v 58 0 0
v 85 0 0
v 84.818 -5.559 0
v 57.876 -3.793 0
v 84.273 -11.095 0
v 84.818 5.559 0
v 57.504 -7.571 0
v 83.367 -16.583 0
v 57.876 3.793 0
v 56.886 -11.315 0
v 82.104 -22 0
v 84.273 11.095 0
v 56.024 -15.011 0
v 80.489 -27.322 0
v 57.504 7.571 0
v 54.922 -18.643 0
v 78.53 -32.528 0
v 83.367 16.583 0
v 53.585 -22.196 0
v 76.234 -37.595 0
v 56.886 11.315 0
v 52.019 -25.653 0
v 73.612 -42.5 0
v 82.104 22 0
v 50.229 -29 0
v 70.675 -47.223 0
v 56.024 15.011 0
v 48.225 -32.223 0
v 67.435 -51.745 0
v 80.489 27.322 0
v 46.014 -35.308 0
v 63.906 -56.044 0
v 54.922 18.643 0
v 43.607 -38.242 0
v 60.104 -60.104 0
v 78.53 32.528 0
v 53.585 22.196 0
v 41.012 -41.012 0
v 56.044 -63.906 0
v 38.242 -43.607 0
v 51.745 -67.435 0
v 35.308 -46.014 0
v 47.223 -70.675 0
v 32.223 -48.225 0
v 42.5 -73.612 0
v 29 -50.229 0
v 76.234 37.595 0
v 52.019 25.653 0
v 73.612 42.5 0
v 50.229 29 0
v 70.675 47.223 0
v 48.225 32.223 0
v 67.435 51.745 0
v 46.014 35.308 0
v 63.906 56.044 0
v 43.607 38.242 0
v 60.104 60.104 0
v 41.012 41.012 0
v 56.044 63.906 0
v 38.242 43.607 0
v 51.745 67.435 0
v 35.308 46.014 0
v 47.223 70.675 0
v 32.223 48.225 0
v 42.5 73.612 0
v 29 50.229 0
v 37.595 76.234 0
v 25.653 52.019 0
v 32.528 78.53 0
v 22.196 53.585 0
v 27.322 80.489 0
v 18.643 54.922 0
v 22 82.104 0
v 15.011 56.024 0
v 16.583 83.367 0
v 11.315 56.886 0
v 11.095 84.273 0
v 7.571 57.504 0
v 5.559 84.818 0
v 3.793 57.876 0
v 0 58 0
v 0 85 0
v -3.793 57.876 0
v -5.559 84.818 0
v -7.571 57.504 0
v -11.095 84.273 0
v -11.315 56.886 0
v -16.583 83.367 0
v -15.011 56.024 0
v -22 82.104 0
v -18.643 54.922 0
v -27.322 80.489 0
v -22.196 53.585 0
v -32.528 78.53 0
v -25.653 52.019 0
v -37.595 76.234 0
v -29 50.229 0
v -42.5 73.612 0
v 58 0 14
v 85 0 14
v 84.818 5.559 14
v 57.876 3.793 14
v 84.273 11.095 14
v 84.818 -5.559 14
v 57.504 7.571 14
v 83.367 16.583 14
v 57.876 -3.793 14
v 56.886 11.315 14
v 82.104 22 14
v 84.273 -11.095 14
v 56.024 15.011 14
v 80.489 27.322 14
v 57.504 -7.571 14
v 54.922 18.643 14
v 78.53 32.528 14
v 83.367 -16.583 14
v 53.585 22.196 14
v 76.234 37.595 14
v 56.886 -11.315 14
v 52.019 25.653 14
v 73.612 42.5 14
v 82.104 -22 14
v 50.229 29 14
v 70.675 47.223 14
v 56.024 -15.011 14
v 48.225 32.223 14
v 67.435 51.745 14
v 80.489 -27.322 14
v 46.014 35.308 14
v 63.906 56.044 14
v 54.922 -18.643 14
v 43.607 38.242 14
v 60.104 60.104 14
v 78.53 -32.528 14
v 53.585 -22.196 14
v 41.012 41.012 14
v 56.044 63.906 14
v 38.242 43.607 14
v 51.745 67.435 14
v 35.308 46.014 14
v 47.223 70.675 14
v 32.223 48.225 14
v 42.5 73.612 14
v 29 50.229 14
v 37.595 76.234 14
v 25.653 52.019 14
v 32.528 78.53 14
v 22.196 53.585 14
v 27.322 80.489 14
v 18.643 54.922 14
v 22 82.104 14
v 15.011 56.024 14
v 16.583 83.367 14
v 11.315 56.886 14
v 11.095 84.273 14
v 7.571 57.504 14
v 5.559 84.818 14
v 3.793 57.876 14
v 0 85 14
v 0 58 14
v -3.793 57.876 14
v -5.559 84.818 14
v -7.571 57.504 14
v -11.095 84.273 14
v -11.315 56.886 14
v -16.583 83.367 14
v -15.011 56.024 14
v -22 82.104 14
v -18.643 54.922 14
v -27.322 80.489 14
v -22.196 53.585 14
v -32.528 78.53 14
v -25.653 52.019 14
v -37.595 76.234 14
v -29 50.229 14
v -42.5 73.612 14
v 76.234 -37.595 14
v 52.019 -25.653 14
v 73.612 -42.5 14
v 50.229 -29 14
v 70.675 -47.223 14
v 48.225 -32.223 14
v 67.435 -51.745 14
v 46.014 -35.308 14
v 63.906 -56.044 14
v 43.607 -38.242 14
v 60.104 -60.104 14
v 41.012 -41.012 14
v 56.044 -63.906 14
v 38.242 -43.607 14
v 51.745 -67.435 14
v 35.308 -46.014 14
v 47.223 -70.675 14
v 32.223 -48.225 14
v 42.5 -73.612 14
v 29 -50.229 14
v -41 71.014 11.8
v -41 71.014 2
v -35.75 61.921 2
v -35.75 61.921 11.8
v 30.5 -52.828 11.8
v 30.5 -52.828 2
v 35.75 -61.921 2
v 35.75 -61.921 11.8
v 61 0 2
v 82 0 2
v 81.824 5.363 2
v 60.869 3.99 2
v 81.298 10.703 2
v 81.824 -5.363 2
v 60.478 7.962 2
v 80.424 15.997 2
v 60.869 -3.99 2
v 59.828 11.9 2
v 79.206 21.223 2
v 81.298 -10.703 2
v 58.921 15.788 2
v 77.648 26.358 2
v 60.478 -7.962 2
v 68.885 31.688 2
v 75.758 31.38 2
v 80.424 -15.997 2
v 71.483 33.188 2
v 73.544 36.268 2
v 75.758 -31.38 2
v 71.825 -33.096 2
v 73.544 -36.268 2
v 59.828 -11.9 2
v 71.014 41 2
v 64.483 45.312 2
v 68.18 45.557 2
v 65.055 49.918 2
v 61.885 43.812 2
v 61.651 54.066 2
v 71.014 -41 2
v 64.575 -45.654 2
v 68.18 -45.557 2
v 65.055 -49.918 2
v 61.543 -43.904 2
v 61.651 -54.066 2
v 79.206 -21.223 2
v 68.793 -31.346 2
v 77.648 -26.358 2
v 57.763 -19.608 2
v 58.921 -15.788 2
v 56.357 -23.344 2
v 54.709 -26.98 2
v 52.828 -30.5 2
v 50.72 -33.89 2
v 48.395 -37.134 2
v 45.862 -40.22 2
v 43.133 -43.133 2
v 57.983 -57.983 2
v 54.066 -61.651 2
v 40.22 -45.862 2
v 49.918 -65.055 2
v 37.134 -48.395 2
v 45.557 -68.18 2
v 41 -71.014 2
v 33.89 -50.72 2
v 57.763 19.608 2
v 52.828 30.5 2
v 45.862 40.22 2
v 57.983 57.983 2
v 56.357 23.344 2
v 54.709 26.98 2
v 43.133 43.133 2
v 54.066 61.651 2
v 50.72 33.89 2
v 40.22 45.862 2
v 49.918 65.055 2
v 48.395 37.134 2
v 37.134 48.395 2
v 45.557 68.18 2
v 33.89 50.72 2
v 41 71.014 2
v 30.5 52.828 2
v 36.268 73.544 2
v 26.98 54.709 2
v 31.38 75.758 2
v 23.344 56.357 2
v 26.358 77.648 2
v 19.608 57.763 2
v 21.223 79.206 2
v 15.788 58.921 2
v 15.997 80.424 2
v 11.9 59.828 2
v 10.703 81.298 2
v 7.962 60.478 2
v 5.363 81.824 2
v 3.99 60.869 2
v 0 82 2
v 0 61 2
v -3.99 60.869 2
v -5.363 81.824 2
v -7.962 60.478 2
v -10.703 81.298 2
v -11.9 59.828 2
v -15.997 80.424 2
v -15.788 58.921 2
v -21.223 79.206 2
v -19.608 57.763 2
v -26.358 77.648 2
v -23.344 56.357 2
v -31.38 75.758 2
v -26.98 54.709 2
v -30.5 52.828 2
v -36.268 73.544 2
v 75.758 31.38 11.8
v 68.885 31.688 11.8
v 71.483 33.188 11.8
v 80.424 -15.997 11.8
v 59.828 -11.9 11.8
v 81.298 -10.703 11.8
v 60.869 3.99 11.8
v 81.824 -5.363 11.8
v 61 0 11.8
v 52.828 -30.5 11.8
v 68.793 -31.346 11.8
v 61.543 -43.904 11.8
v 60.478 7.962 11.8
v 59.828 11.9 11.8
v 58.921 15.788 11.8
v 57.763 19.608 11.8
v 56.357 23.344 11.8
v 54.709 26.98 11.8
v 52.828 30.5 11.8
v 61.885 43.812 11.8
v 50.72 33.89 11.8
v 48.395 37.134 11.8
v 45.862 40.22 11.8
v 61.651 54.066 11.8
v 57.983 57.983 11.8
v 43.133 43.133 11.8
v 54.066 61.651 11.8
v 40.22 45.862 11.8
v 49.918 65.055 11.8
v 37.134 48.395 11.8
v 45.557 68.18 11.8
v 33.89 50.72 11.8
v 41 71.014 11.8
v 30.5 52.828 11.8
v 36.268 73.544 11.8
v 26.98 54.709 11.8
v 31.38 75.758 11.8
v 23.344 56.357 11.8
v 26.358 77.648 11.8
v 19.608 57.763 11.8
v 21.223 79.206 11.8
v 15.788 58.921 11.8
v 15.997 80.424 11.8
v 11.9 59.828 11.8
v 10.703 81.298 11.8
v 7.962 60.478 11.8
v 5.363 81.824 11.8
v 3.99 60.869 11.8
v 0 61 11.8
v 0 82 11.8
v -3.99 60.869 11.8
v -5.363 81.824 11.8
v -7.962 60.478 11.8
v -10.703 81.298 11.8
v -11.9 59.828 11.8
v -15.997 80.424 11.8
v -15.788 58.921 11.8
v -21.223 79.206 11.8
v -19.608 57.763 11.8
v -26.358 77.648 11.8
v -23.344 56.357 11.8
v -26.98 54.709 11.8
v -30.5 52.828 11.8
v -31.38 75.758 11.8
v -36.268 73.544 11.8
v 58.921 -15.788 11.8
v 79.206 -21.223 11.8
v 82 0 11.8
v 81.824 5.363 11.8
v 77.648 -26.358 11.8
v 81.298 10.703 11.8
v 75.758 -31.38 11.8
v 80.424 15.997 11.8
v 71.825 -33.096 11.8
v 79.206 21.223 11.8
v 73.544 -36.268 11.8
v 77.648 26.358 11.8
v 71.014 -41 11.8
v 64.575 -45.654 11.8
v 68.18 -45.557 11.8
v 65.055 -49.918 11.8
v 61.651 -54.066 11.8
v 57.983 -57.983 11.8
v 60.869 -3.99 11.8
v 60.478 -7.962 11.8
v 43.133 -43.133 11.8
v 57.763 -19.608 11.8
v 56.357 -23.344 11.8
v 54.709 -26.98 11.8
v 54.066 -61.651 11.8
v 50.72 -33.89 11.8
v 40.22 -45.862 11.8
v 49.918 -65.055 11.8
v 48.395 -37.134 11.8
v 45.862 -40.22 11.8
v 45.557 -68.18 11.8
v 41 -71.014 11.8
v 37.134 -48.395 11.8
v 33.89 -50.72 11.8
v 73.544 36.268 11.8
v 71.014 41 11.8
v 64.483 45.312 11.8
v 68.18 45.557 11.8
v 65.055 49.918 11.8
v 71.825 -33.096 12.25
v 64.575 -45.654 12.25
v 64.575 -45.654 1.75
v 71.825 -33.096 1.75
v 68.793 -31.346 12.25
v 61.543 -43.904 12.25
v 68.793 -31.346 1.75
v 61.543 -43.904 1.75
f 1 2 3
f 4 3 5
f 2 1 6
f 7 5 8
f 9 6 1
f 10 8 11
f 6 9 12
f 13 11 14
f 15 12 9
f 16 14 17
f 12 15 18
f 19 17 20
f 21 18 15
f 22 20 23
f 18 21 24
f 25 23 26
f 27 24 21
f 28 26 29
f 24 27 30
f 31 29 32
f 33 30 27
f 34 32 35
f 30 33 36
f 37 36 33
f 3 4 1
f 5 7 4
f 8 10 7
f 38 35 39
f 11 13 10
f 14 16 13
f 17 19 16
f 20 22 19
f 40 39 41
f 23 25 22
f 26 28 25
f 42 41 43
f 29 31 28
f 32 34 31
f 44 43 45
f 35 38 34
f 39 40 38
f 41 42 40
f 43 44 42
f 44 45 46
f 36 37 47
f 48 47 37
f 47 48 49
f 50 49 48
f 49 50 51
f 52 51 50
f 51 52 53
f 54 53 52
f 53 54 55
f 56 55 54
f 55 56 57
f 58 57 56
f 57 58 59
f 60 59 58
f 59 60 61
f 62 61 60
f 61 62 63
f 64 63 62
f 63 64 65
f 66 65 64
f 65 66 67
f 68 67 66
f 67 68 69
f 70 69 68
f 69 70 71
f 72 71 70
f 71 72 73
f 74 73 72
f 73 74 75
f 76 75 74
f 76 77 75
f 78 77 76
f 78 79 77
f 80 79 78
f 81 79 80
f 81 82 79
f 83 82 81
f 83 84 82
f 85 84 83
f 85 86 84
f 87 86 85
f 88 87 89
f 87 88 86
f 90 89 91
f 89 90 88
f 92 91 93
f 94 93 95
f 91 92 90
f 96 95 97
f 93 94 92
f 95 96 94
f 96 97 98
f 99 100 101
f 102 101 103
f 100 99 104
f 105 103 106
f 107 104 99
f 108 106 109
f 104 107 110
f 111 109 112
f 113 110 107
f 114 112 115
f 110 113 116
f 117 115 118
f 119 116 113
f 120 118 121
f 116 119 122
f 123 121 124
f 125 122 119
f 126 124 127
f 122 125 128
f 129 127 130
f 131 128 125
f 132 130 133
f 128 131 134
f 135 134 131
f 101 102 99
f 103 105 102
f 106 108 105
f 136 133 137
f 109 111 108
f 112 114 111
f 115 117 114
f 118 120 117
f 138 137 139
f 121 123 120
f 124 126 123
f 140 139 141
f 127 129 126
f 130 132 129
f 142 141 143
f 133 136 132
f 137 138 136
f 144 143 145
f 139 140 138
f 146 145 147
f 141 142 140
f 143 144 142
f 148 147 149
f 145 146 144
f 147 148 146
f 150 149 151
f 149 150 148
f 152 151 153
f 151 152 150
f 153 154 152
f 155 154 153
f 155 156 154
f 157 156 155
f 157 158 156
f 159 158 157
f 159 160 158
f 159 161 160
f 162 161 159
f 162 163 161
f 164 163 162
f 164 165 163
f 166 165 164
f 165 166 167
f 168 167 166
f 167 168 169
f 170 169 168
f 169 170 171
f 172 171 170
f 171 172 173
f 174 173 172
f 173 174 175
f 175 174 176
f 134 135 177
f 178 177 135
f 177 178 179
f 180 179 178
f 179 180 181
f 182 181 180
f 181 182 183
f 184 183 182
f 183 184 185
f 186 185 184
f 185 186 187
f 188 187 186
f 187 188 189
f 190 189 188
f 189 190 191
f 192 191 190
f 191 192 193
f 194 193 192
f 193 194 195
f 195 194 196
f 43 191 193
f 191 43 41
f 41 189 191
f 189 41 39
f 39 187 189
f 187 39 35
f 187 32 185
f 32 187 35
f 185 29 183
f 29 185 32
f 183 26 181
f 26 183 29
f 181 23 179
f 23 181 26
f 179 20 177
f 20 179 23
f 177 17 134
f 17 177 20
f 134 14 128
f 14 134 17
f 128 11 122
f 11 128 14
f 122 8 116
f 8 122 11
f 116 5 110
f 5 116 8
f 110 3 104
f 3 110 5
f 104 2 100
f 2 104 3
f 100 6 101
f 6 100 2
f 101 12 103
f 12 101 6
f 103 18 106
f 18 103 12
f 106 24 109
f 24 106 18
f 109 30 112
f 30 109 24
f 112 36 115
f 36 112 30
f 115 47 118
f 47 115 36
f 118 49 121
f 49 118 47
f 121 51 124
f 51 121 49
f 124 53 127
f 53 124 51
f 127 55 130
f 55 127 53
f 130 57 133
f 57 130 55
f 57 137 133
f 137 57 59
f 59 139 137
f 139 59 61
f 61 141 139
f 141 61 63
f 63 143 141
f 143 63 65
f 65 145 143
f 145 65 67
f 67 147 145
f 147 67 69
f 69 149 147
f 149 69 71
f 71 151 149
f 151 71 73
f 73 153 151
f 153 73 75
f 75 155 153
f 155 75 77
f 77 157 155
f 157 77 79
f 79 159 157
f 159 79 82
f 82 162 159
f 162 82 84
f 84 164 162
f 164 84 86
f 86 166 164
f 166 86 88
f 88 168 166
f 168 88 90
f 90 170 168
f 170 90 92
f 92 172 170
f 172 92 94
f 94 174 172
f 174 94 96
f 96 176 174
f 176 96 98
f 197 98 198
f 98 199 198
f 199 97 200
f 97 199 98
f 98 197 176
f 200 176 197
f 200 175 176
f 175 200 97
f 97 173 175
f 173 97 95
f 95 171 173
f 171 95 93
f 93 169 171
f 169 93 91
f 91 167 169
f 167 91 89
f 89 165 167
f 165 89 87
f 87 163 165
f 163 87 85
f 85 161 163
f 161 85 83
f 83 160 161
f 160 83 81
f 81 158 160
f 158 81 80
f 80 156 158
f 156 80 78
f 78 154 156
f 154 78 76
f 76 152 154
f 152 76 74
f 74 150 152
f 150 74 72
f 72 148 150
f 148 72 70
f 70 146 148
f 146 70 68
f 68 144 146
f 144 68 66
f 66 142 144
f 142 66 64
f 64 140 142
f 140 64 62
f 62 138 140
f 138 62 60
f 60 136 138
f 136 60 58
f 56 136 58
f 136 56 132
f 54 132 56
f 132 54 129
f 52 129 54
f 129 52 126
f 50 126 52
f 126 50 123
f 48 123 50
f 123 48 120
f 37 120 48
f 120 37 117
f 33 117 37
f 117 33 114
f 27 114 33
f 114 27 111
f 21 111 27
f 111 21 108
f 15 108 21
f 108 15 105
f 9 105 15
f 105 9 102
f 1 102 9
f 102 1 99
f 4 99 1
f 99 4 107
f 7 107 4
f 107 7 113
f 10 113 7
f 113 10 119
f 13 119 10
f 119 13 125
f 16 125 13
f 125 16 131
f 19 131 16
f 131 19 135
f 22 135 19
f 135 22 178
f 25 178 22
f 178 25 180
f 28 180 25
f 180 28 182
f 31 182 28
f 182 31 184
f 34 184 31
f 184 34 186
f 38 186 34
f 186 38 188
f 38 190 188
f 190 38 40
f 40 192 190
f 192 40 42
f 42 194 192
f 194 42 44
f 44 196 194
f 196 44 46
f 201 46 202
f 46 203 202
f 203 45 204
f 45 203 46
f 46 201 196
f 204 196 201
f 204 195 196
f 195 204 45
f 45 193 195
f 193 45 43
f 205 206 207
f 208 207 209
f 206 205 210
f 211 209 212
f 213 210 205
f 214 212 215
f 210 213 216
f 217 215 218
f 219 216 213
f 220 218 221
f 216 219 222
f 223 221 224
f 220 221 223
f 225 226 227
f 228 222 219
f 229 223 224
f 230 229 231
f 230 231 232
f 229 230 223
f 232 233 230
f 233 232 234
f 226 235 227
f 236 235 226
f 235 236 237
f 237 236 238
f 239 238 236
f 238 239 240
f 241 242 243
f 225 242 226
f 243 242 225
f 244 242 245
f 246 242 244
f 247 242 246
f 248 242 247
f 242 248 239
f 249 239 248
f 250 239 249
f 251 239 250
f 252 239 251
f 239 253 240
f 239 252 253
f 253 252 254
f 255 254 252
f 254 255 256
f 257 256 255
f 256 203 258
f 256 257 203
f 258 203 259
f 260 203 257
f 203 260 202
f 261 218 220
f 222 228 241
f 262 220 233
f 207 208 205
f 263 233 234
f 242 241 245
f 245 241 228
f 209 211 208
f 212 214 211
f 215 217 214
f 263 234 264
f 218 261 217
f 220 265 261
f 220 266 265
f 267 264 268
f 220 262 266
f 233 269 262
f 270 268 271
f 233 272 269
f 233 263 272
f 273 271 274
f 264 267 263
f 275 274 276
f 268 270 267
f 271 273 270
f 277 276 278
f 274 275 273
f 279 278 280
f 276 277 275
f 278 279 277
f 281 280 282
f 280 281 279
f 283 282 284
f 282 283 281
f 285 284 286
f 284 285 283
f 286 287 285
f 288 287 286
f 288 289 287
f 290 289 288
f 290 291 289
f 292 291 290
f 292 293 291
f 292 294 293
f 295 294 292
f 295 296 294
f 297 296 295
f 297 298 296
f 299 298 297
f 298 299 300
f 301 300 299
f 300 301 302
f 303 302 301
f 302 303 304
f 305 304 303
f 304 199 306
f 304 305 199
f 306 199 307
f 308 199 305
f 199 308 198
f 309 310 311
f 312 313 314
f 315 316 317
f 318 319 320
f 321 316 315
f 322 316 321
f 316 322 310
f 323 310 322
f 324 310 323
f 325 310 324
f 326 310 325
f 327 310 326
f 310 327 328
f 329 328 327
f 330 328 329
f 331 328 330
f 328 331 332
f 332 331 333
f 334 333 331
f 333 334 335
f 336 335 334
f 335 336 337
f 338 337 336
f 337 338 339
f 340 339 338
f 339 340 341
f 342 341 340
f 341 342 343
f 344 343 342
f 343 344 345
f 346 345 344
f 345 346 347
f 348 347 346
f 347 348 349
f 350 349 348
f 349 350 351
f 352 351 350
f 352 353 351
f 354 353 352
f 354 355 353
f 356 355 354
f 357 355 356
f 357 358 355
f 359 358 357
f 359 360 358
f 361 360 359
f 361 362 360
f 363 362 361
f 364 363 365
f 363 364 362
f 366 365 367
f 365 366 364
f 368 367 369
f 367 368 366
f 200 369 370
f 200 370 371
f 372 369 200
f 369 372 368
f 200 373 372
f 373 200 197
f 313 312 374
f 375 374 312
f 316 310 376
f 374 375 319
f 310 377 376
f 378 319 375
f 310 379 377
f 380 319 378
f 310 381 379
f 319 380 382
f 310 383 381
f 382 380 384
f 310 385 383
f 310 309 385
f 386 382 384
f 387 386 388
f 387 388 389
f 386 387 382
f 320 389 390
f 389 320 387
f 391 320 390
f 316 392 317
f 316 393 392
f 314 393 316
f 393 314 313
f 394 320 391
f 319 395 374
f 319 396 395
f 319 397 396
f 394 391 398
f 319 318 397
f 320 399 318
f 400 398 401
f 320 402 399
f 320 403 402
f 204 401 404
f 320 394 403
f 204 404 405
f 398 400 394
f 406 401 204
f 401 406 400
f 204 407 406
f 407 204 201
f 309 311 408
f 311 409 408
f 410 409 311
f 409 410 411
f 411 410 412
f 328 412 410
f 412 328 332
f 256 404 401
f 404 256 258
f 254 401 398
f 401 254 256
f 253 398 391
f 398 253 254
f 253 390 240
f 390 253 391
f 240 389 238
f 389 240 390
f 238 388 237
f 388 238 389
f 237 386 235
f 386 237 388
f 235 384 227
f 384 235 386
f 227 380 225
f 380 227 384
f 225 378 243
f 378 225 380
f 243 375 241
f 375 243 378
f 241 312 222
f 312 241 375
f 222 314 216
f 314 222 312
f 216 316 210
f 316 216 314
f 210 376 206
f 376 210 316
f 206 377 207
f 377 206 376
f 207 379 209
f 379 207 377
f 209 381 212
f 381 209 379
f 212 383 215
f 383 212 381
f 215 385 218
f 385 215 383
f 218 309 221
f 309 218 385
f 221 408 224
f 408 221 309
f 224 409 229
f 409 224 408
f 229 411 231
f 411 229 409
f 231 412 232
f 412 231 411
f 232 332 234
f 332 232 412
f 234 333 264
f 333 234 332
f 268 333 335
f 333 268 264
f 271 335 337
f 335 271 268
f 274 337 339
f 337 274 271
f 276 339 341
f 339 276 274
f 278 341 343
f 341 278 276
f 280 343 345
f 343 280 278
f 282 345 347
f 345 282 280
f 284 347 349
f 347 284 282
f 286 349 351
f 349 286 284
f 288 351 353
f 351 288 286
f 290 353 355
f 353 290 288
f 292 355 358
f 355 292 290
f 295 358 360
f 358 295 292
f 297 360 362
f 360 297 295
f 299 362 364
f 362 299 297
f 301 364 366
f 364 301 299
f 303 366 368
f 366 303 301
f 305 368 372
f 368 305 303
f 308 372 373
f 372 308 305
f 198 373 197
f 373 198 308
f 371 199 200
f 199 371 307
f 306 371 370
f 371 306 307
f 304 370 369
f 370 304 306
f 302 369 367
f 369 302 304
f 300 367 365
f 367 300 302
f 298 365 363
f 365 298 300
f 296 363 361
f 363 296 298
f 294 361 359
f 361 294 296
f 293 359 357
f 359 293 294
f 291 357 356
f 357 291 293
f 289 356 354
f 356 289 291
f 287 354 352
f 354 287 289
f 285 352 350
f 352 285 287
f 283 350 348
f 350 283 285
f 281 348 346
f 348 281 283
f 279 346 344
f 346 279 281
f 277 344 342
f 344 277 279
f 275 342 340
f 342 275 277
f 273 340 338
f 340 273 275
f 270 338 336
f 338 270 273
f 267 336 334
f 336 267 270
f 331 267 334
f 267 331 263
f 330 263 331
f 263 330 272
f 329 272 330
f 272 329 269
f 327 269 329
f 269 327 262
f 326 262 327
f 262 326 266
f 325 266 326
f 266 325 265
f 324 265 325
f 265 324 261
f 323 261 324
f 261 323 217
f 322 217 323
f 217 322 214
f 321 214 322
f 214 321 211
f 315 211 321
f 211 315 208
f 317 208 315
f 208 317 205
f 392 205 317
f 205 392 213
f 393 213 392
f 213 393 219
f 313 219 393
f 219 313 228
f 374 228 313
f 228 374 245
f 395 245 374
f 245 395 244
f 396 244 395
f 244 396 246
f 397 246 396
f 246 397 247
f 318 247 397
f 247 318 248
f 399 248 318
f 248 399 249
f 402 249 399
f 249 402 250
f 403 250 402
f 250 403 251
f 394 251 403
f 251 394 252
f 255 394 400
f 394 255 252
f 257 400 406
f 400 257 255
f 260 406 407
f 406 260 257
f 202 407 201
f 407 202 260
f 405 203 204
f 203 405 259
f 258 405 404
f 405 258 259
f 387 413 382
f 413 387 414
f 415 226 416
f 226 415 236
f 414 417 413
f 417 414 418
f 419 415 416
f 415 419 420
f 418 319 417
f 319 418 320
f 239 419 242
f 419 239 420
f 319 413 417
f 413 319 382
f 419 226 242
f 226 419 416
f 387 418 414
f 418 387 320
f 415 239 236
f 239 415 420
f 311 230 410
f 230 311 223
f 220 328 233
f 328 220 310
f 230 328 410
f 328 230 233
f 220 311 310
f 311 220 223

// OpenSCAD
// TS-PET-C02 - Snap-Together Track Segment
$fn = 96; seg_angle = 60; track_outer_r = 85; track_inner_r = 58; track_h = 14; floor_t = 2.0; roof_t = 2.2; join_w = 14; join_t = 3.0; join_h = 10;
module arc2d(ro, ri, ang) {
    difference() {
        intersection() { circle(r = ro); rotate([0,0, ang/2]) translate([0,-ro]) square([ro*2, ro*2]); rotate([0,0,-ang/2]) translate([-ro,-ro]) square([ro*2, ro*2]); }
        intersection() { circle(r = ri); rotate([0,0, ang/2]) translate([0,-ro]) square([ro*2, ro*2]); rotate([0,0,-ang/2]) translate([-ro,-ro]) square([ro*2, ro*2]); }
    }
}
difference() { linear_extrude(height = track_h) arc2d(track_outer_r, track_inner_r, seg_angle); translate([0,0,floor_t]) linear_extrude(height = track_h - floor_t - roof_t) arc2d(track_outer_r - 3, track_inner_r + 3, seg_angle); rotate([0,0,-seg_angle/2]) translate([track_outer_r - 8,0,track_h/2]) cube([join_t + 0.5, join_w + 0.5, join_h + 0.5], center = true); }
rotate([0,0,seg_angle/2]) translate([track_outer_r - 8,0,track_h/2]) cube([join_t, join_w, join_h], center = true);
